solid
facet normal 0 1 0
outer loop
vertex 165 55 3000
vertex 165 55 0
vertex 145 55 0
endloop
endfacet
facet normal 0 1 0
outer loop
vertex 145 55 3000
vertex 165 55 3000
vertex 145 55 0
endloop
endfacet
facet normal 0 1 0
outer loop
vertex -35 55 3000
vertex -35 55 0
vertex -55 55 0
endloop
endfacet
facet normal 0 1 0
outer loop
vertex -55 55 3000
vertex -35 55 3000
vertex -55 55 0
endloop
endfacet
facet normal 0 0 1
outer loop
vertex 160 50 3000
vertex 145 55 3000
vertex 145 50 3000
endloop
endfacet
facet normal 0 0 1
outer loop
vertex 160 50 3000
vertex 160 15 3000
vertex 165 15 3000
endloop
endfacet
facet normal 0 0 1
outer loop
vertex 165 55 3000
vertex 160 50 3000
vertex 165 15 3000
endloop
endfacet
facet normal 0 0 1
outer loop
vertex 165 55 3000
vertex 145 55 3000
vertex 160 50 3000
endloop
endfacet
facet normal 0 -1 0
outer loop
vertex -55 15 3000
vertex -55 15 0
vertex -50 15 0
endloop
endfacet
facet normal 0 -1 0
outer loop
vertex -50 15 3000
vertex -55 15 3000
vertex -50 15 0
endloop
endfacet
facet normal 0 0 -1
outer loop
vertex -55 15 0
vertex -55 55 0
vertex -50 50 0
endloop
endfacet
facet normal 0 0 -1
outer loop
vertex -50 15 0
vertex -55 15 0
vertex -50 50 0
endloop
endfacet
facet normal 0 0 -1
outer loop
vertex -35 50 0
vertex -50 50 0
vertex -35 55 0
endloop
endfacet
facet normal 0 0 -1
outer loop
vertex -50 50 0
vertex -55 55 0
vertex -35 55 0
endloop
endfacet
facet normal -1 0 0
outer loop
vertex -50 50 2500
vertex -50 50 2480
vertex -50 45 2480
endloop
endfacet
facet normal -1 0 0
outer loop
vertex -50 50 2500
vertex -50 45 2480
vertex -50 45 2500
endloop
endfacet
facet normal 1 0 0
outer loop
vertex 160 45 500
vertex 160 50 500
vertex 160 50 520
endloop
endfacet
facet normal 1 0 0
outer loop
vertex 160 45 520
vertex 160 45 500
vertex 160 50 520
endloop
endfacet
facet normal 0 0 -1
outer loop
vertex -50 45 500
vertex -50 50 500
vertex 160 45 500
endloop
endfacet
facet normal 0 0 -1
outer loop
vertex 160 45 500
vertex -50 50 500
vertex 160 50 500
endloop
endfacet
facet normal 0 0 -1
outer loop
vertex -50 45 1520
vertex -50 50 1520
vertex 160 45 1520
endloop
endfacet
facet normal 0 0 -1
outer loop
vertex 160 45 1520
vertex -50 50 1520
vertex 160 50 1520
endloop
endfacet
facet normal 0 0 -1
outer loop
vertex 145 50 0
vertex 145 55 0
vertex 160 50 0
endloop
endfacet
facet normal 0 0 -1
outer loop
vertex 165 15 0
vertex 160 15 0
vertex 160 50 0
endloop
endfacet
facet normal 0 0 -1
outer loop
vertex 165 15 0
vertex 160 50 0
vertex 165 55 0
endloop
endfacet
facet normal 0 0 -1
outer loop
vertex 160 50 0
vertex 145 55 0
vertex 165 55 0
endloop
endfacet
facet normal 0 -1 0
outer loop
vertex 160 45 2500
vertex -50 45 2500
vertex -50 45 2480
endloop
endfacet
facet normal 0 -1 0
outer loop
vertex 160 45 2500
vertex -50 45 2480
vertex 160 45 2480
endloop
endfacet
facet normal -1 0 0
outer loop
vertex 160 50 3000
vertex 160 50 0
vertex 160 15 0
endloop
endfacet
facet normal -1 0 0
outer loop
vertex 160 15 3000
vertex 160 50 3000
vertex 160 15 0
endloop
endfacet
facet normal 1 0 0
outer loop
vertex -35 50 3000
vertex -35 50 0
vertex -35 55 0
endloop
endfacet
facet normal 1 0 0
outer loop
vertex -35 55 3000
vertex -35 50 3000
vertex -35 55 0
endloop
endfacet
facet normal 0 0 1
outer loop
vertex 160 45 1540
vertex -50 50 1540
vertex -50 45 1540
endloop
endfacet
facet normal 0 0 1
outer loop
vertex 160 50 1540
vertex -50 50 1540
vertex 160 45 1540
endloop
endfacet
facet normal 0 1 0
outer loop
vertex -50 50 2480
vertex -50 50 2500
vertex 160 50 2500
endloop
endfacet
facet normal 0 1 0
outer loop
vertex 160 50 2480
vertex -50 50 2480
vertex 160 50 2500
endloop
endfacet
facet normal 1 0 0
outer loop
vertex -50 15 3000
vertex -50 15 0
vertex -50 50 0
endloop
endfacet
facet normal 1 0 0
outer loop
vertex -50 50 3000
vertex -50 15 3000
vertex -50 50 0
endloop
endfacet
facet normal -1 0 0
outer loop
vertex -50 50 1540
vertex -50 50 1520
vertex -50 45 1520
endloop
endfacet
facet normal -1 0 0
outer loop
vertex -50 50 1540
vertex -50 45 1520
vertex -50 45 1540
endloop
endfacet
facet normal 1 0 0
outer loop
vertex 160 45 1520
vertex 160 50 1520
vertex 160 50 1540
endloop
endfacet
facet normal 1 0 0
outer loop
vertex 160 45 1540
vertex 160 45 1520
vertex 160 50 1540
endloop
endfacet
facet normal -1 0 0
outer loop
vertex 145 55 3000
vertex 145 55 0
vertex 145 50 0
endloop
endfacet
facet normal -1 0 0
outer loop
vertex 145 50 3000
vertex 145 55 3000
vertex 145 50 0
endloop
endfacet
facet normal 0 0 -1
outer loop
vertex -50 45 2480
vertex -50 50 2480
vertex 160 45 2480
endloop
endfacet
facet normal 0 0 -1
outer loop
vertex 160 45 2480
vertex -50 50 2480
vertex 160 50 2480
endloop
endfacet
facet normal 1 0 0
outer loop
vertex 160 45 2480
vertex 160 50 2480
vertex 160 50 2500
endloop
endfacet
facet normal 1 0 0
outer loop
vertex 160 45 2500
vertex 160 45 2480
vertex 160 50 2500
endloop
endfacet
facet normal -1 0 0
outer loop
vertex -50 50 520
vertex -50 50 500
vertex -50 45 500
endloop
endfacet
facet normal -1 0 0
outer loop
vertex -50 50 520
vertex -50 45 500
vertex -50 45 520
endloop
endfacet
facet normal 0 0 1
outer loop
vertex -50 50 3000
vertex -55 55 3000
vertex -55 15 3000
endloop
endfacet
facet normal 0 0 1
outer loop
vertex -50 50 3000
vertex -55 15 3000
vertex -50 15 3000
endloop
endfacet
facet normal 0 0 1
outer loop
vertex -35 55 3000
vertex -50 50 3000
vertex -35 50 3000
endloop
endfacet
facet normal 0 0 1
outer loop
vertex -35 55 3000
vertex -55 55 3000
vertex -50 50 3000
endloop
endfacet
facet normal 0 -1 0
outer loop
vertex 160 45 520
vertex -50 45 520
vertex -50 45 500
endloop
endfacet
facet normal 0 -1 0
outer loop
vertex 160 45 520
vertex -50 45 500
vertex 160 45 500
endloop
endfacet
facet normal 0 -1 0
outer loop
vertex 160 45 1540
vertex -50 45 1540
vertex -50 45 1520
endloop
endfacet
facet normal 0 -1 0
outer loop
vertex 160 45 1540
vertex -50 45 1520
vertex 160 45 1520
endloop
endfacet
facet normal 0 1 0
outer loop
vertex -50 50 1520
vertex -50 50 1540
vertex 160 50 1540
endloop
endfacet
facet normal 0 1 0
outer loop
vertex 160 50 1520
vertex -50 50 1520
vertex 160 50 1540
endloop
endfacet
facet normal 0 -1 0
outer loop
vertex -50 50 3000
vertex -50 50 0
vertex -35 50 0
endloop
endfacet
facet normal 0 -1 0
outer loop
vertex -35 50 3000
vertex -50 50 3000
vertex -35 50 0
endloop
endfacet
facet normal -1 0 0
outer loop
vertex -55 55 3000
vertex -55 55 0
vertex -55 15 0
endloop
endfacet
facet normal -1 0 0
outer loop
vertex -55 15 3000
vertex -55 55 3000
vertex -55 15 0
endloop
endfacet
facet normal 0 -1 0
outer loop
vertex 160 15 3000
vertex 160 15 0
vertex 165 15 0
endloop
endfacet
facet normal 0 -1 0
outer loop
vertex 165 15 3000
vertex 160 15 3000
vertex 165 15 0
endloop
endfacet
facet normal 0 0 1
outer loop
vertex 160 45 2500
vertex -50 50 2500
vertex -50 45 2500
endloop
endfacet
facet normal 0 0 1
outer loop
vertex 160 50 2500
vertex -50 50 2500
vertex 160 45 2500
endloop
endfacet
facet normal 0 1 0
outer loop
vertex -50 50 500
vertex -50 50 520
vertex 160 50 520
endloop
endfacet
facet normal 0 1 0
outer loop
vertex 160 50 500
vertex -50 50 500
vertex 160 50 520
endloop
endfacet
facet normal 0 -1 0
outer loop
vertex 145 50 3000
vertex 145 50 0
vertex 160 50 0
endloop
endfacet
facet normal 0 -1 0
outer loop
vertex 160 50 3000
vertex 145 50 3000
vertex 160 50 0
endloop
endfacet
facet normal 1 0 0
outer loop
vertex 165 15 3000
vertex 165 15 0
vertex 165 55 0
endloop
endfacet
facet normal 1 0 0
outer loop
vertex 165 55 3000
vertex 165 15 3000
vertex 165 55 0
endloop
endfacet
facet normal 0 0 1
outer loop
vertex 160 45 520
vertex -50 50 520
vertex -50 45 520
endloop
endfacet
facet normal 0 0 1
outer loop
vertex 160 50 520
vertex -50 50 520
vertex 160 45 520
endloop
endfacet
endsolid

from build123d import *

# Parameters (mm, degrees)
F1_DEPTH = 3000
F2_W     = 210
F2_H     = 20
F3_DEPTH = 5
F4_W     = 210
F4_H     = 20
F5_DEPTH = 5
F6_W     = 210
F6_H     = 20
F7_DEPTH = 5


with BuildPart() as f1:
    # F0 (on Top) → F1 (new body)
    with BuildSketch(Plane.XY):
        Polygon((-35, 55), (-55, 55), (-55, 15), (-50, 15), (-50, 50), (-35, 50), align=None)
        Polygon((165, 55), (145, 55), (145, 50), (160, 50), (160, 15), (165, 15), align=None)
    extrude(amount=F1_DEPTH)


with BuildPart() as f3:
    # F2 (on face) → F3 (new body)
    with BuildSketch(Plane.XZ.offset(-50)):
        with Locations((55, 2490)):
            Rectangle(F2_W, F2_H)
    extrude(amount=F3_DEPTH)


with BuildPart() as f5:
    # F4 (on face) → F5 (new body)
    with BuildSketch(Plane.XZ.offset(-50)):
        with Locations((55, 510)):
            Rectangle(F4_W, F4_H)
    extrude(amount=F5_DEPTH)


with BuildPart() as f7:
    # F6 (on face) → F7 (new body)
    with BuildSketch(Plane.XZ.offset(-50)):
        with Locations((55, 1530)):
            Rectangle(F6_W, F6_H)
    extrude(amount=F7_DEPTH)


solid = Compound([f1.part, f3.part, f5.part, f7.part])
